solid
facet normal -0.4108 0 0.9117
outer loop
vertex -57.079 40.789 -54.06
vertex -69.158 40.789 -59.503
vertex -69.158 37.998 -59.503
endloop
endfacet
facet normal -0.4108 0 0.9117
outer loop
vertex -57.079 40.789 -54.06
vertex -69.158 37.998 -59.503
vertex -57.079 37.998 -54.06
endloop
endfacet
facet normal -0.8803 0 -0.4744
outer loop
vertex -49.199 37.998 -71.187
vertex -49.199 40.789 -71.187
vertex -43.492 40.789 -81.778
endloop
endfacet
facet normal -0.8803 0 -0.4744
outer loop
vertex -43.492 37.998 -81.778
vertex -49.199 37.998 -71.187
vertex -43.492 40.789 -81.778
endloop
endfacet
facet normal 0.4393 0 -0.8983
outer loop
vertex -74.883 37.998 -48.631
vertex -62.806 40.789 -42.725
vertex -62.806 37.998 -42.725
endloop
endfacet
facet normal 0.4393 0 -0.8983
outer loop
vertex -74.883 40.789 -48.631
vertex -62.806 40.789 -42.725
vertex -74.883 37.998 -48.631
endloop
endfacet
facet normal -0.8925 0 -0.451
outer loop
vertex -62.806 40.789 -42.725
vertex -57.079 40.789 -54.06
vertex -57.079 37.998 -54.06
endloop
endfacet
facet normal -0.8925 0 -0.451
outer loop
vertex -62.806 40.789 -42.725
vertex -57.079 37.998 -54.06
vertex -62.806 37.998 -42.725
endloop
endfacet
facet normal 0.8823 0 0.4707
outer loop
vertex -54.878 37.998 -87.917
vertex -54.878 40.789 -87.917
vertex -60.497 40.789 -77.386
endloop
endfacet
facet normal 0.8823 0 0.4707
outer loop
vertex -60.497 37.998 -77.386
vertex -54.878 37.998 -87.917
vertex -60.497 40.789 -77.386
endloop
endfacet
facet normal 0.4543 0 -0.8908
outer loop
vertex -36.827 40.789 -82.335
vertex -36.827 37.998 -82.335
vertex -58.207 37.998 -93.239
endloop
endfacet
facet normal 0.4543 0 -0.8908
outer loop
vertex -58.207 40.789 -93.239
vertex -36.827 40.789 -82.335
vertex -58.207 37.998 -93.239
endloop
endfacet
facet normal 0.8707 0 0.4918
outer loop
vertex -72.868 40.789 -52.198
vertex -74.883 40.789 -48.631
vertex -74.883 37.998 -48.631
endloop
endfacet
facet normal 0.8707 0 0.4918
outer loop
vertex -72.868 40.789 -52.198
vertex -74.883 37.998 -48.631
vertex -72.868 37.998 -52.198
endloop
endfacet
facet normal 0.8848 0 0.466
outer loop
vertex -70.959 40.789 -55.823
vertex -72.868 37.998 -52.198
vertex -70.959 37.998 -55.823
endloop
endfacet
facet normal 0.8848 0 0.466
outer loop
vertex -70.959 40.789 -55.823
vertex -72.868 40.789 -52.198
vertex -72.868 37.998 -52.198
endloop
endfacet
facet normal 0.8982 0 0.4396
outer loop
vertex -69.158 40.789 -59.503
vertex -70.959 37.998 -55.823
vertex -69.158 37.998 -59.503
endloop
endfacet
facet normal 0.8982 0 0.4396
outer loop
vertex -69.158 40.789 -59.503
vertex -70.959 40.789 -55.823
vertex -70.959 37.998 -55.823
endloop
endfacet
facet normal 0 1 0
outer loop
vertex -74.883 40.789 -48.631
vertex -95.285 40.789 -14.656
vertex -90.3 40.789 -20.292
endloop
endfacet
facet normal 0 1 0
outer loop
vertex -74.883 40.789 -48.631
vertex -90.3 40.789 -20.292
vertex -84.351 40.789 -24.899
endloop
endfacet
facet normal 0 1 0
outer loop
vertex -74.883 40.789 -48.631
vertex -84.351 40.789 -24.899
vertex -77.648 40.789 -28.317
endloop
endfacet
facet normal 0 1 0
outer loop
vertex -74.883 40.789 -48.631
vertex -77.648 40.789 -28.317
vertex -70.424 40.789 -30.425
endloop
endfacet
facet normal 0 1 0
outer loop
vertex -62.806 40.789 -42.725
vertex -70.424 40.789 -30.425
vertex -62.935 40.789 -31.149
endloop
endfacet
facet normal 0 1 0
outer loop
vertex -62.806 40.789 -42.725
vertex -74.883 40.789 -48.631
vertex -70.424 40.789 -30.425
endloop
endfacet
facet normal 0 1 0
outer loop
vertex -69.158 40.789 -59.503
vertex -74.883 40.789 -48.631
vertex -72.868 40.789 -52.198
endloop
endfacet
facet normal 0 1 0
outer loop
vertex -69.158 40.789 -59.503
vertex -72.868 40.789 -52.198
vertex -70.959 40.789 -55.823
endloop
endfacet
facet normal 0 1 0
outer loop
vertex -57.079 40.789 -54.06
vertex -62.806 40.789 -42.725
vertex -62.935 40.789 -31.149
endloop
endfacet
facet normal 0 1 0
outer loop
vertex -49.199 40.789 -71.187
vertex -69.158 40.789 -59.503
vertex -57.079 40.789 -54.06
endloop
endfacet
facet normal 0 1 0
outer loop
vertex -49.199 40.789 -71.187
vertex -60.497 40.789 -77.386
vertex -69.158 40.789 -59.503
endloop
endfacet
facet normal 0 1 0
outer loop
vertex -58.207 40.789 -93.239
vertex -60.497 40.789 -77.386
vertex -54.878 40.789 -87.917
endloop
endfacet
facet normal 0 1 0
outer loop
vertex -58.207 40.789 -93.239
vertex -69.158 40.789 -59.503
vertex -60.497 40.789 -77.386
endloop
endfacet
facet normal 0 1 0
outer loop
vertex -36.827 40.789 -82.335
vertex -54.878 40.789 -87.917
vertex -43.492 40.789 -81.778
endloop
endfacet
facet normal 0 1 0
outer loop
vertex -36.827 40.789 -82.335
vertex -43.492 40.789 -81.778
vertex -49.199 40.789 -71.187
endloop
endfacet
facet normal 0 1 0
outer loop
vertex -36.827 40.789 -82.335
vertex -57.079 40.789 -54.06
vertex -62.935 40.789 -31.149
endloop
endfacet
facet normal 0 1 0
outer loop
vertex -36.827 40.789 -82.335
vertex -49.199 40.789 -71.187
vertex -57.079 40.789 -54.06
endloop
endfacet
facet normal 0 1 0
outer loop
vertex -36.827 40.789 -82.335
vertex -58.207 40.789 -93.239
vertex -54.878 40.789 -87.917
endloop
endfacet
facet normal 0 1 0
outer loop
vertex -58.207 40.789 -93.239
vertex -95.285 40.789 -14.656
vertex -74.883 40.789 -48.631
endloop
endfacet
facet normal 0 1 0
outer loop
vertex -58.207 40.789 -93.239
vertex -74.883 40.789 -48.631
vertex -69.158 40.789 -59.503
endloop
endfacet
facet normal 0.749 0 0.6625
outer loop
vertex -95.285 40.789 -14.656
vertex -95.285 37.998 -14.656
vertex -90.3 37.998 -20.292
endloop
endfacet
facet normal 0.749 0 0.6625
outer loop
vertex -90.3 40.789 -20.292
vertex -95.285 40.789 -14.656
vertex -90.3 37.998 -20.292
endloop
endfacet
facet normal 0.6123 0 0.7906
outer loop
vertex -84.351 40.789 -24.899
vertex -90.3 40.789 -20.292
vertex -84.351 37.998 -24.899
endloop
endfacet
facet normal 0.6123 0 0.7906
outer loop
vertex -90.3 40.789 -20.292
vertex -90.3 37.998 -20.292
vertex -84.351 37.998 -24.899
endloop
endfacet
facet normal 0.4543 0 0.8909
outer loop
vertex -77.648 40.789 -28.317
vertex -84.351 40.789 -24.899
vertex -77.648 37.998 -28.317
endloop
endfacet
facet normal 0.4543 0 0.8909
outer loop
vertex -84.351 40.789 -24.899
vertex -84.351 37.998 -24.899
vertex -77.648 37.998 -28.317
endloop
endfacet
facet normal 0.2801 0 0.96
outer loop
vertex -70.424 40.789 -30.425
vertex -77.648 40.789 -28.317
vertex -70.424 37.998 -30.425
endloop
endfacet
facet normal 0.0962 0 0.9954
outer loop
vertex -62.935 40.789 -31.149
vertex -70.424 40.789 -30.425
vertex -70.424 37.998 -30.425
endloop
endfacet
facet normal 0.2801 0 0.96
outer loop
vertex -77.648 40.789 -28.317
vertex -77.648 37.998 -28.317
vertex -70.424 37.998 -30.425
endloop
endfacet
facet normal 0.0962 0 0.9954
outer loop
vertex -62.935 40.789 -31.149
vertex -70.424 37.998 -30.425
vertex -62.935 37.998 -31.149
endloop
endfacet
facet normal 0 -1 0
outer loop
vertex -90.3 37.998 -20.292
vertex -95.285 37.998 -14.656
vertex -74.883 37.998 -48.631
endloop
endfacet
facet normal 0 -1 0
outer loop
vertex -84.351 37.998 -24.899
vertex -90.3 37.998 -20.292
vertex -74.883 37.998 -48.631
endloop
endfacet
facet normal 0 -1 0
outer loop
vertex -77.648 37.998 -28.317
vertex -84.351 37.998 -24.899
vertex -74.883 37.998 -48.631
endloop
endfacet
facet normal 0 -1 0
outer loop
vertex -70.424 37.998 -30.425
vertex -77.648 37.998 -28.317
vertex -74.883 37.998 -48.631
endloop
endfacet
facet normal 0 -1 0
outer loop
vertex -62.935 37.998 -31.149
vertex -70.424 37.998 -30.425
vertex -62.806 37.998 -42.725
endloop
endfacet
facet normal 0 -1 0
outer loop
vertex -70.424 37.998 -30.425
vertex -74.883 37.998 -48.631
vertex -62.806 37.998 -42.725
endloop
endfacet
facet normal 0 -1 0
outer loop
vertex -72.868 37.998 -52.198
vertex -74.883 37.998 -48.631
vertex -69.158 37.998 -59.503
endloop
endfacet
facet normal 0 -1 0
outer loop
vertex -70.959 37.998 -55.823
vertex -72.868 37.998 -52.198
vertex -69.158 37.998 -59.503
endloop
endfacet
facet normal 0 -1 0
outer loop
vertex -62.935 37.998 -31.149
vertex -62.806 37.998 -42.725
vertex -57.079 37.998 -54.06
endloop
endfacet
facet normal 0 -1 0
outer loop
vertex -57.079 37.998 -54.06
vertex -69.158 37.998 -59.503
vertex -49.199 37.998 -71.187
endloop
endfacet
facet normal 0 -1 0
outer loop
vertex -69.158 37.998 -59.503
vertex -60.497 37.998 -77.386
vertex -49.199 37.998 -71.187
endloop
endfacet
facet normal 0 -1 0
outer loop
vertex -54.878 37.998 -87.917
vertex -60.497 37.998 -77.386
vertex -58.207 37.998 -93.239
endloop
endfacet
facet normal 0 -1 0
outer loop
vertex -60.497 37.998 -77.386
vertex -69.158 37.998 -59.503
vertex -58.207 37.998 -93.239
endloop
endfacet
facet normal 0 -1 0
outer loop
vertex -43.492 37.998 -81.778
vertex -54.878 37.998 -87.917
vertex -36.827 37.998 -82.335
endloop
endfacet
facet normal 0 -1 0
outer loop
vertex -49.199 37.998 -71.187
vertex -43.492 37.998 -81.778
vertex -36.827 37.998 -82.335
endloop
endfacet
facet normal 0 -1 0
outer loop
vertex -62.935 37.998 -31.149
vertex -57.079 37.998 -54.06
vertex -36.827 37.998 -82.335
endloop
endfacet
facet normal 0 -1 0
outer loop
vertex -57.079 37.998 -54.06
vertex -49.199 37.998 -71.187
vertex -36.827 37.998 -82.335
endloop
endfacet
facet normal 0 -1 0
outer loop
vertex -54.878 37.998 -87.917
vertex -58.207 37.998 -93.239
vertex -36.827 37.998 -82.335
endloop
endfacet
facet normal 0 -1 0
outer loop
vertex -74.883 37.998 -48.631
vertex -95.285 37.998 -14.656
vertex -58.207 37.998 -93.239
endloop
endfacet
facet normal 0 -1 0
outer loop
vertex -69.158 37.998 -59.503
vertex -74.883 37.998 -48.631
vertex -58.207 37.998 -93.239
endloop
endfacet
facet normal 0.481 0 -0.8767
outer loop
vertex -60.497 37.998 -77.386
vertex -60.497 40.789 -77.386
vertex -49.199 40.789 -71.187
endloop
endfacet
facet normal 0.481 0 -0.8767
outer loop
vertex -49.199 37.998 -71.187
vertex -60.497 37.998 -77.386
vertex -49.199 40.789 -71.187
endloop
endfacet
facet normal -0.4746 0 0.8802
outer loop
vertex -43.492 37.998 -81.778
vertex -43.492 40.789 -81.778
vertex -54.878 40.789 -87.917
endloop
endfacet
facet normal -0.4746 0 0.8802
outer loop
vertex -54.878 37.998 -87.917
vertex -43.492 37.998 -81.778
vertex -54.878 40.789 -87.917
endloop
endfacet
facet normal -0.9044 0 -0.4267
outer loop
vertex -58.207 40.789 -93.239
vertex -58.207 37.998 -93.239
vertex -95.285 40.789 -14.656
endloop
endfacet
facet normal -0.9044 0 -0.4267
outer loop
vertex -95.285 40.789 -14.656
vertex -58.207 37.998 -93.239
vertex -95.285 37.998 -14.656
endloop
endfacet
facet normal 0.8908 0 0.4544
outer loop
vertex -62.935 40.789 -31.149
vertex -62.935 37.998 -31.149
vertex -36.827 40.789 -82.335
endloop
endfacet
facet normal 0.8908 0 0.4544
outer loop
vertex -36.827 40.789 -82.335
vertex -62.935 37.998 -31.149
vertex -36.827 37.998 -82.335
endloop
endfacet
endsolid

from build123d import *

# Parameters (mm, degrees)
BOSS_EXTRUDE3_DEPTH      = 1
BOSS_EXTRUDE3_DEPTH_BACK = 1.791091685
CUT_EXTRUDE4_DEPTH       = 134.344317451
CUT_EXTRUDE7_DEPTH       = 134.344317451


with BuildPart() as part:
    # Sketch2 → Boss-Extrude3 (new, two sides: drawn at the far end of the back side and taken through both)
    with BuildSketch(Plane(origin=(0, 39.78932127, 0), x_dir=(1, 0, 0), z_dir=(0, 1, 0)).offset(-BOSS_EXTRUDE3_DEPTH_BACK)):
        with BuildLine():
            Line((-62.934827524, 31.1490062), (-36.827019598, 82.334560695))
            Line((-36.827019598, 82.334560695), (-58.206533771, 93.239439133))
            Line((-58.206533771, 93.239439133), (-95.285485747, 14.655800367))
            ThreePointArc((-95.285485747, 14.655800367), (-81.079538231, 26.765253936), (-62.934827524, 31.1490062))
        make_face()
    extrude(amount=BOSS_EXTRUDE3_DEPTH + BOSS_EXTRUDE3_DEPTH_BACK)

    # Sketch14 → Cut-Extrude4 (cut, through all)
    with BuildSketch(Plane(origin=(0, 40.78932127, 0), x_dir=(1, 0, 0), z_dir=(0, 1, 0))):
        Polygon((-60.497453494, 77.385579161), (-49.198590392, 71.186677889), (-43.491580172, 81.777523219), (-54.878158967, 87.916549938), align=None)
    extrude(amount=-CUT_EXTRUDE4_DEPTH, mode=Mode.SUBTRACT)

    # Sketch15 → Cut-Extrude7 (cut, through all)
    with BuildSketch(Plane(origin=(0, 40.78932127, 0), x_dir=(1, 0, 0), z_dir=(0, 1, 0))):
        with BuildLine():
            Line((-69.15808426, 59.503123178), (-57.079111782, 54.0598094))
            Line((-57.079111782, 54.0598094), (-62.805804845, 42.724997947))
            Line((-62.805804845, 42.724997947), (-74.883268234, 48.631494641))
            ThreePointArc((-74.883268234, 48.631494641), (-71.899649138, 54.003573981), (-69.15808426, 59.503123178))
        make_face()
    extrude(amount=-CUT_EXTRUDE7_DEPTH, mode=Mode.SUBTRACT)


solid = part.part
